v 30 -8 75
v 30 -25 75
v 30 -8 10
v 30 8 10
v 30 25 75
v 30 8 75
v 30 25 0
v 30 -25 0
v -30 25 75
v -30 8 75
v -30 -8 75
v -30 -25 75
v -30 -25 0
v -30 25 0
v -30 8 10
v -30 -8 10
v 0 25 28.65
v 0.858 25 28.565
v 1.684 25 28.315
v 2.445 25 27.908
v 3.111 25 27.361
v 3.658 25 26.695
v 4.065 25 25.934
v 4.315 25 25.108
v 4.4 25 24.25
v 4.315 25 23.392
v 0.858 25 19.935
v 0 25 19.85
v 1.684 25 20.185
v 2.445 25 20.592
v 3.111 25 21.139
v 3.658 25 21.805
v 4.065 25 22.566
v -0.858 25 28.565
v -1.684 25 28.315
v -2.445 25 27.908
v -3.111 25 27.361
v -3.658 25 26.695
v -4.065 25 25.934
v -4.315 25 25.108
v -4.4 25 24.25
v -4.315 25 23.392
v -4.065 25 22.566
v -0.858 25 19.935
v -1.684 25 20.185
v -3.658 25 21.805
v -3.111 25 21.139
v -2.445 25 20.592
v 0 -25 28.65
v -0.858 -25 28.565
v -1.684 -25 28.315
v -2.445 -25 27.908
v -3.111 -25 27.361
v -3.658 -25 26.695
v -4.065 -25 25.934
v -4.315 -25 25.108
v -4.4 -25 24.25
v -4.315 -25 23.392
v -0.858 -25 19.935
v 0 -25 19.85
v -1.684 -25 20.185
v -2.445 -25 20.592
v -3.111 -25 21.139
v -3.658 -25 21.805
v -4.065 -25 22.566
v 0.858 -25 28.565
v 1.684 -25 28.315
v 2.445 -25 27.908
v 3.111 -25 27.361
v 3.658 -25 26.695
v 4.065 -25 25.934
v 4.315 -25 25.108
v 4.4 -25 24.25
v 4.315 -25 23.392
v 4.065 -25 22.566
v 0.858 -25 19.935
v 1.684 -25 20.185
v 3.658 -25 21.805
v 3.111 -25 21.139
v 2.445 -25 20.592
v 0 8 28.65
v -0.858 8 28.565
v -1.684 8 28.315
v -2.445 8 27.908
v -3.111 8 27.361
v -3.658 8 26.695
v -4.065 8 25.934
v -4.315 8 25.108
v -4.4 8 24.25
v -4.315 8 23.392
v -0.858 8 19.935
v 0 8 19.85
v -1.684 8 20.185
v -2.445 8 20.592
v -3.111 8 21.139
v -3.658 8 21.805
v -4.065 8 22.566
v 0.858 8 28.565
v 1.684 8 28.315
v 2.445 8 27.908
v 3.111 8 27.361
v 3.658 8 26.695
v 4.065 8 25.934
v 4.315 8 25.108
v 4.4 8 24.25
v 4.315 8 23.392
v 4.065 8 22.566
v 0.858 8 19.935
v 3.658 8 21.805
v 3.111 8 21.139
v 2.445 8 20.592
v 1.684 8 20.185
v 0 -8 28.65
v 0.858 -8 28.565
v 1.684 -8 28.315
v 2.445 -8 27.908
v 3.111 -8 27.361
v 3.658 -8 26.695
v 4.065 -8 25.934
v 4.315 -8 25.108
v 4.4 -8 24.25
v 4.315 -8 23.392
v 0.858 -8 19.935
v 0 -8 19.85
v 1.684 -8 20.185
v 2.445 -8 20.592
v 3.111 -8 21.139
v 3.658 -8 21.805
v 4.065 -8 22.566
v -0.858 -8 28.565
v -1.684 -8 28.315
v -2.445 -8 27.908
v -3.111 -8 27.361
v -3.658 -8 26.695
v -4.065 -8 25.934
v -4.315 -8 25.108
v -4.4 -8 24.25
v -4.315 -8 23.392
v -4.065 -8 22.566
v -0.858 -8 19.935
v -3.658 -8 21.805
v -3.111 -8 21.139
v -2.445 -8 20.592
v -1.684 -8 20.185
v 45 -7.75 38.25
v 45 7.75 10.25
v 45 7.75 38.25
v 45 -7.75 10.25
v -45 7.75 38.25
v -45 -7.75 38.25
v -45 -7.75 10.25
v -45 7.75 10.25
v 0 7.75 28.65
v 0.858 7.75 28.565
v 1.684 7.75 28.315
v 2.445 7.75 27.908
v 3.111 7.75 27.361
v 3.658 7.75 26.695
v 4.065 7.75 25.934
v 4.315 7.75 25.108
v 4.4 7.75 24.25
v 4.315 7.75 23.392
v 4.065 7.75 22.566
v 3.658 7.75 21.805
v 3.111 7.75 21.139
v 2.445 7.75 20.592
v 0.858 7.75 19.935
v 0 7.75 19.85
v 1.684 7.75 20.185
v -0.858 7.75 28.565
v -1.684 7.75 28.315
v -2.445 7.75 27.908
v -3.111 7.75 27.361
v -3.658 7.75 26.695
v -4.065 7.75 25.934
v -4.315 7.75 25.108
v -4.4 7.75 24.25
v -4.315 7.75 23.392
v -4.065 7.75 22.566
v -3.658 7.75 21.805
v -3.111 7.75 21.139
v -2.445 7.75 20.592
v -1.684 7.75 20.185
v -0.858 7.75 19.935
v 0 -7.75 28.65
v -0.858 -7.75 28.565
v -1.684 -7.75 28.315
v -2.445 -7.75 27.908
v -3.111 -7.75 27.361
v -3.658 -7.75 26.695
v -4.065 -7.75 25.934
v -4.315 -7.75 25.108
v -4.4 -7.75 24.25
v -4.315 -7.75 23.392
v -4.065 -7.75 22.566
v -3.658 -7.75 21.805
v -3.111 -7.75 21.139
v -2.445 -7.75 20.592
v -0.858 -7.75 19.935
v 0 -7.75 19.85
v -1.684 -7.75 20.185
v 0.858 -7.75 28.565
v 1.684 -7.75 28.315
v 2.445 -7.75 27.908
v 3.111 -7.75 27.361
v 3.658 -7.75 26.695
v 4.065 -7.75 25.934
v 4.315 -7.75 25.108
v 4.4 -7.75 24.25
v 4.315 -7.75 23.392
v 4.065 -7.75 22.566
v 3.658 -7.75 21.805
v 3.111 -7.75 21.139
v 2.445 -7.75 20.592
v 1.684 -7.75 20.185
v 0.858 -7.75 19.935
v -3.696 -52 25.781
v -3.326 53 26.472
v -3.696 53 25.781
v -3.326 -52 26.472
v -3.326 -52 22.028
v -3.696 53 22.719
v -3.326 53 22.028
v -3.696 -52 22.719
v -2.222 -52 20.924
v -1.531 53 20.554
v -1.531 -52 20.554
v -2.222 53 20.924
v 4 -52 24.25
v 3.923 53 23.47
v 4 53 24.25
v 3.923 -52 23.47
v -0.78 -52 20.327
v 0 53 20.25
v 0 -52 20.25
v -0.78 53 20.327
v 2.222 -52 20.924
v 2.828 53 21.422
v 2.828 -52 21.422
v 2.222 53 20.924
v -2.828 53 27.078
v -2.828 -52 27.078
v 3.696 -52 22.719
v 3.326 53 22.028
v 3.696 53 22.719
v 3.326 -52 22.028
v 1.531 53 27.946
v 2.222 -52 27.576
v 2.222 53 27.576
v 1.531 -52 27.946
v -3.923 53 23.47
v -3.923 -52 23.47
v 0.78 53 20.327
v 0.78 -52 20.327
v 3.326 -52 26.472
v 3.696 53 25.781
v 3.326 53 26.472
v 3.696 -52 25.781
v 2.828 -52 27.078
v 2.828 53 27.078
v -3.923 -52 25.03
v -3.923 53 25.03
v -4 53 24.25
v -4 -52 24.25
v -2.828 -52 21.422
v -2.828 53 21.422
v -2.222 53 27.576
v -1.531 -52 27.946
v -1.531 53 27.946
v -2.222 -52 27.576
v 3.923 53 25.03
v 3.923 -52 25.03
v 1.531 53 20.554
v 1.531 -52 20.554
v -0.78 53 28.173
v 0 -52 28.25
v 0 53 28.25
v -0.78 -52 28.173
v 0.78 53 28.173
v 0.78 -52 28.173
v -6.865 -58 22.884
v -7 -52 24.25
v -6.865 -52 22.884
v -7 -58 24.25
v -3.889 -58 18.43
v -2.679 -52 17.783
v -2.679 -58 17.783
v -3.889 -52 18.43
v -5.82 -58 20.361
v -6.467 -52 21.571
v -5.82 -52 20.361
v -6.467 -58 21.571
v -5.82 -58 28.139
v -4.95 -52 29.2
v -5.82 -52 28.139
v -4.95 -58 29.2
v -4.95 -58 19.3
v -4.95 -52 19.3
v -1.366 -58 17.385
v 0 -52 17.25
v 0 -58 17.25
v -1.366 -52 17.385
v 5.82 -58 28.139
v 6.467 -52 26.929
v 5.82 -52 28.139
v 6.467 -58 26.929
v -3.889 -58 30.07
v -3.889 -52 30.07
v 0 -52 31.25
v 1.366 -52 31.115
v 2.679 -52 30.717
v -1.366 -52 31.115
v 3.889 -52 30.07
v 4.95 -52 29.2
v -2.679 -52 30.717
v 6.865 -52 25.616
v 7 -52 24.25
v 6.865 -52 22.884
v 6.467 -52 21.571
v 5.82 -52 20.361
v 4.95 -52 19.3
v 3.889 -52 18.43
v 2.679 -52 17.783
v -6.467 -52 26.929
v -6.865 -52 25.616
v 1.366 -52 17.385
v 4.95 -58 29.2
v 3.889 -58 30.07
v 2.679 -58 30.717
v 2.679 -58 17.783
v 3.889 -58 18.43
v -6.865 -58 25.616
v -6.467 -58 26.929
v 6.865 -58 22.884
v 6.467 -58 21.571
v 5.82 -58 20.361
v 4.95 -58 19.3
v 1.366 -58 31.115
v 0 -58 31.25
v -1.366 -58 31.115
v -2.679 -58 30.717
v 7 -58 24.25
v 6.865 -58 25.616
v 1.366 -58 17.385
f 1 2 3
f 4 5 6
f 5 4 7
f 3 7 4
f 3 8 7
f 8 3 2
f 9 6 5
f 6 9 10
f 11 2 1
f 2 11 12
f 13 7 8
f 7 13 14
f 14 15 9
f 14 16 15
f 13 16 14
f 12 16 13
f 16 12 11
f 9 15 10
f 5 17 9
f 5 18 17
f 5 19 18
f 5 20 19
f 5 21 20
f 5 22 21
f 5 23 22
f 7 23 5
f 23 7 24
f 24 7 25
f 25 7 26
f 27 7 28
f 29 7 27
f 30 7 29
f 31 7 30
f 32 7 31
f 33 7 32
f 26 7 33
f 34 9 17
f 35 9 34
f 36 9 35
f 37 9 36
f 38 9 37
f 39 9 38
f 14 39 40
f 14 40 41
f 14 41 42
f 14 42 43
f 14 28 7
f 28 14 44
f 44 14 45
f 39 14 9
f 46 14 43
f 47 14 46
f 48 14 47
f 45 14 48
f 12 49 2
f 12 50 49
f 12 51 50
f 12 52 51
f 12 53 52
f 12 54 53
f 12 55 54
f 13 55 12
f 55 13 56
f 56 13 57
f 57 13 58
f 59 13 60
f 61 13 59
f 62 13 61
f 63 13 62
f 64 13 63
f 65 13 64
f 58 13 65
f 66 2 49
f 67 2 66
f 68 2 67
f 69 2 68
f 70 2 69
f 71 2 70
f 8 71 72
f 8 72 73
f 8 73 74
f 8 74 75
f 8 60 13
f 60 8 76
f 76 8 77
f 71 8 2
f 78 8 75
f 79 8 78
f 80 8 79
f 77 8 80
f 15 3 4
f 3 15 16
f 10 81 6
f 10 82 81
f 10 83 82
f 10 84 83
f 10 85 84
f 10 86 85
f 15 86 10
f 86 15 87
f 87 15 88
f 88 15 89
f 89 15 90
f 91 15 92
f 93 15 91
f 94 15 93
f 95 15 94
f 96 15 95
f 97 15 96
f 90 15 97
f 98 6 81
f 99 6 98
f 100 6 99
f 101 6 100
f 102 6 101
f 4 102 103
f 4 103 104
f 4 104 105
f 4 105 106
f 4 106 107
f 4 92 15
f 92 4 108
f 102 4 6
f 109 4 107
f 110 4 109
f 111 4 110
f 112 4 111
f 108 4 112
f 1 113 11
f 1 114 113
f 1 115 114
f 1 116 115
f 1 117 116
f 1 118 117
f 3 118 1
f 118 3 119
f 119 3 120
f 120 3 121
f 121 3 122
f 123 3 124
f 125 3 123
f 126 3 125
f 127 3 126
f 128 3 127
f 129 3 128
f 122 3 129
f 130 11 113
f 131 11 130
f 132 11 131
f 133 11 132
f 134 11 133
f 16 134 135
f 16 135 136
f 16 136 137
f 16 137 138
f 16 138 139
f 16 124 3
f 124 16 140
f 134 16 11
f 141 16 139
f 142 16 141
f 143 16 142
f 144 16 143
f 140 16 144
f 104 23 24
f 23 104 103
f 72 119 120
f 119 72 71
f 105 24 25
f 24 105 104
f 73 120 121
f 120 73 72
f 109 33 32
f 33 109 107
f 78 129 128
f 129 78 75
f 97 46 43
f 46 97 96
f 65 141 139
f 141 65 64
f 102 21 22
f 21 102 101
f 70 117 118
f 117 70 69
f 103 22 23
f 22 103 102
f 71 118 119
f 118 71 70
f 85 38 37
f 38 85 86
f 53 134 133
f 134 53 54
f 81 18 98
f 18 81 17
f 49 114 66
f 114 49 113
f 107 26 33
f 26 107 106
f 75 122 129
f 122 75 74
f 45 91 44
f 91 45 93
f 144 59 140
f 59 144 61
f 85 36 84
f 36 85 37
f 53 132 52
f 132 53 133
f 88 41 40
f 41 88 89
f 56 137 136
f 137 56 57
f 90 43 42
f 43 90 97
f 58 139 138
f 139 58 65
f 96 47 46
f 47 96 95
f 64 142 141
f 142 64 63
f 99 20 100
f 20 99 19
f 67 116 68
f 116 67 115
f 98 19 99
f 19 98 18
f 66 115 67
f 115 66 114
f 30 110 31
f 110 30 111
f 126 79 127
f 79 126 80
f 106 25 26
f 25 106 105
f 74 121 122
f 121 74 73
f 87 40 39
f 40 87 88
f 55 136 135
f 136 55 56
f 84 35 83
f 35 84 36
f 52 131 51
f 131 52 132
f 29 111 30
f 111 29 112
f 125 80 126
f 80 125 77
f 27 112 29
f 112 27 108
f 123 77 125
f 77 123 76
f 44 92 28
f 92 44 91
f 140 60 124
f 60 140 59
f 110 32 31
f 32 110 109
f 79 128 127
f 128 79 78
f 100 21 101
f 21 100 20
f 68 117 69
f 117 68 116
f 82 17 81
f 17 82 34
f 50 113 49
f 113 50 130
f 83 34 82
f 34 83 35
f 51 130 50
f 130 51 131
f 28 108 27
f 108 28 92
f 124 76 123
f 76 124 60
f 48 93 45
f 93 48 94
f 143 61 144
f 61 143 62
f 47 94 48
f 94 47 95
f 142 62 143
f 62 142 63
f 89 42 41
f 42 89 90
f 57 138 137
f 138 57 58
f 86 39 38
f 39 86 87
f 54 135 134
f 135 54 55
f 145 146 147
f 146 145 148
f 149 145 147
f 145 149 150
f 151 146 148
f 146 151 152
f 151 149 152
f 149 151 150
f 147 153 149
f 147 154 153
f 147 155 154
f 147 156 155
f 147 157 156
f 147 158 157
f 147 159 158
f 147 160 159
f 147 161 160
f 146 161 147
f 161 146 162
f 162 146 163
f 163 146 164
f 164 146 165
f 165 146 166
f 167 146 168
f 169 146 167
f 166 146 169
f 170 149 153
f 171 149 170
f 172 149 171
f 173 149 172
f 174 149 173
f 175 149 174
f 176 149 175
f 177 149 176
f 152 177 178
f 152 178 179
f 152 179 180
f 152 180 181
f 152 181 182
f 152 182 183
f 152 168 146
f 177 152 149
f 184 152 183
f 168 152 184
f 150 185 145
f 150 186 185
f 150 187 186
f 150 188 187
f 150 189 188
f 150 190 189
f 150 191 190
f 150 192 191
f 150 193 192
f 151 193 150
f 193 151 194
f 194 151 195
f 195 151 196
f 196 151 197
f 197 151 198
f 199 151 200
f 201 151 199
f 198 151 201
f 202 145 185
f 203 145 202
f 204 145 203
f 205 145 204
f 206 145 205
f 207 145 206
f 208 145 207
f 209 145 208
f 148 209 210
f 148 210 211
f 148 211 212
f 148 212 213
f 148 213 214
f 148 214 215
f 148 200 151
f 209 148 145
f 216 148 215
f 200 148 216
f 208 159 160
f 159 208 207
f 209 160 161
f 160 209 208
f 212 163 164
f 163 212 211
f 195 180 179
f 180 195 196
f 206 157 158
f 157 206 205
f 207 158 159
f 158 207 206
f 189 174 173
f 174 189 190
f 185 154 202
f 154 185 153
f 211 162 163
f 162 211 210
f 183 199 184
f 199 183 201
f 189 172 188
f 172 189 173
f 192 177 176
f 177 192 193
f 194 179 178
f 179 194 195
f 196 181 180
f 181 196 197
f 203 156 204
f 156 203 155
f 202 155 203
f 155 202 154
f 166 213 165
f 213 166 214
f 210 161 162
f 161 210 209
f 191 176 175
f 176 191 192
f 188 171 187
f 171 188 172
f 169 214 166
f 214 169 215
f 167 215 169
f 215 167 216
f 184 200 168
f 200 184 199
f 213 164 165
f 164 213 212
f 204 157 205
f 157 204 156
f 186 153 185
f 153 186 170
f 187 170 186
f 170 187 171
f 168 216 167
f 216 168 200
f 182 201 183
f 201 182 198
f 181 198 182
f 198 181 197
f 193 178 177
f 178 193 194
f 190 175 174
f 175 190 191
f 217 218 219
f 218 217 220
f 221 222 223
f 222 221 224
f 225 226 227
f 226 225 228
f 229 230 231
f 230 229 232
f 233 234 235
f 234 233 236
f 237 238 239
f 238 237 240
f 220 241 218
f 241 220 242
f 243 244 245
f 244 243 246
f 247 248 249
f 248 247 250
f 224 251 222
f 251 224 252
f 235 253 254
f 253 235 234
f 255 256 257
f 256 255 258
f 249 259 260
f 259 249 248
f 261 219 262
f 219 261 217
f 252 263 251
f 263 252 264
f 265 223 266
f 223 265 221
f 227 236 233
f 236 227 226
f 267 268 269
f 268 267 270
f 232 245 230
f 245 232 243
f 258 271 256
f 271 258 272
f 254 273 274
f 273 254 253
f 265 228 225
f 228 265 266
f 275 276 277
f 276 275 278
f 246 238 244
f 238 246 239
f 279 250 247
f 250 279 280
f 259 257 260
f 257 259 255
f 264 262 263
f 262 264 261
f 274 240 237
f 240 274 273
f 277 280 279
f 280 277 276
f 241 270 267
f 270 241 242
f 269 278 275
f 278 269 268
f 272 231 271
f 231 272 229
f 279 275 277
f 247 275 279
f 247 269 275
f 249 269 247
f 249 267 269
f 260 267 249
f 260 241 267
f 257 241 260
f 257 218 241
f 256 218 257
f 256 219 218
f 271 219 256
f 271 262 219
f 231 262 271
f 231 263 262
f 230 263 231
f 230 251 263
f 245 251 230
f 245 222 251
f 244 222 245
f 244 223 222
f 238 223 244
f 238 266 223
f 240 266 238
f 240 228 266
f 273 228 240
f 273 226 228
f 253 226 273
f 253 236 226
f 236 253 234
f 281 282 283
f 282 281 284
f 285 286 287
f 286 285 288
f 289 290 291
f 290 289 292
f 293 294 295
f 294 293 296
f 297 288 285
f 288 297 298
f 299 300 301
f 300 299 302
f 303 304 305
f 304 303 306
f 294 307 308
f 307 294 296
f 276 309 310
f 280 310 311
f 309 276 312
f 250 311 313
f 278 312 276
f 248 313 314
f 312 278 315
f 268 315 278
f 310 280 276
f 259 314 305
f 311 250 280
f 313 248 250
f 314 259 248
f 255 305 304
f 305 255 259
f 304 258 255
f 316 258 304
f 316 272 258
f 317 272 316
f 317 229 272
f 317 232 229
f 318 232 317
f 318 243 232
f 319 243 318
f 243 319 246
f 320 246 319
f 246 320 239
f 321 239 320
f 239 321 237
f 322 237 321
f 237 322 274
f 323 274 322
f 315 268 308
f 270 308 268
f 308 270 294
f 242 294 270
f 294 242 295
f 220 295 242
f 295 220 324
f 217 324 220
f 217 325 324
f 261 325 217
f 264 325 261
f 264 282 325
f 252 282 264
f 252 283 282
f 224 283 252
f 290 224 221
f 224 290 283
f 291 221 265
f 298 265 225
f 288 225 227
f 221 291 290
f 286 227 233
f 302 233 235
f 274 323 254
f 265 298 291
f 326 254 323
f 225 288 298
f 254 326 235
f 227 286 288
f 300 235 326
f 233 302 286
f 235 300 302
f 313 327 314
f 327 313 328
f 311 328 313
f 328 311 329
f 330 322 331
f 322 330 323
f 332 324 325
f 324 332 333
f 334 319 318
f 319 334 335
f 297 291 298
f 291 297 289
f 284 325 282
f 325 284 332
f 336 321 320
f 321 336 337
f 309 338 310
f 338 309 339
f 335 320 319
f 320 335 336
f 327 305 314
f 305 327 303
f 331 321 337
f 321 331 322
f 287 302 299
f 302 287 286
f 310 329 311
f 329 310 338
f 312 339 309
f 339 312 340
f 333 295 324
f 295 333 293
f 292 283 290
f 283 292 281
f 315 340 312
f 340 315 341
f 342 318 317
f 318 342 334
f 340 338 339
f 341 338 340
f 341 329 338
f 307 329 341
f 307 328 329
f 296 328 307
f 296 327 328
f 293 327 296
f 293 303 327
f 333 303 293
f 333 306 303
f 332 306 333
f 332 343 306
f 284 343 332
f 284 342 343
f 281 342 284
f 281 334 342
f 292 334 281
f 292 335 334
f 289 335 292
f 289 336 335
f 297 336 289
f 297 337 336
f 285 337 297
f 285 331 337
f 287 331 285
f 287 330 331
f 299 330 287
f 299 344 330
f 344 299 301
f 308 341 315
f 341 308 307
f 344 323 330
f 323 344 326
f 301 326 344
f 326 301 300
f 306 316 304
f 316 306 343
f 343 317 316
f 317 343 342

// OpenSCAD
$fn = 32;

// ------------------------------------------------------------------------
// Clevis joint: 60 mm clevis, pin d8
// Every part is its own module, assembly() places them once.
// ------------------------------------------------------------------------

// --- part 1 ---
module clevis() {
  difference() {
    translate([-30, -25, 0]) cube([60, 50, 75]);
    translate([-31, -8, 10]) cube([62, 16, 66]);
    translate([0, 0, 24.25]) rotate([90, 0, 0]) cylinder(h = 52, d = 8.8, center = true);
  }
}

// --- part 2 ---
module eye() {
  difference() {
    translate([-45, -7.75, 0]) cube([90, 15.5, 28]);
    translate([0, 0, 14]) rotate([90, 0, 0]) cylinder(h = 17.5, d = 8.8, center = true);
  }
}

// --- part 3 ---
module pin() {
  rotate([0, 90, 0]) cylinder(h = 106, d = 8, center = true);
  translate([-58, 0, 0]) rotate([0, 90, 0]) cylinder(h = 6, d = 14);
}

// --- assembly ---
module assembly() {
  translate([0, 0, 0]) rotate([0, 0, 0]) clevis();
  translate([0, 0, 10.25]) rotate([0, 0, 0]) eye();
  translate([0, 0, 24.25]) rotate([0, 0, 90]) pin();
}

assembly();
